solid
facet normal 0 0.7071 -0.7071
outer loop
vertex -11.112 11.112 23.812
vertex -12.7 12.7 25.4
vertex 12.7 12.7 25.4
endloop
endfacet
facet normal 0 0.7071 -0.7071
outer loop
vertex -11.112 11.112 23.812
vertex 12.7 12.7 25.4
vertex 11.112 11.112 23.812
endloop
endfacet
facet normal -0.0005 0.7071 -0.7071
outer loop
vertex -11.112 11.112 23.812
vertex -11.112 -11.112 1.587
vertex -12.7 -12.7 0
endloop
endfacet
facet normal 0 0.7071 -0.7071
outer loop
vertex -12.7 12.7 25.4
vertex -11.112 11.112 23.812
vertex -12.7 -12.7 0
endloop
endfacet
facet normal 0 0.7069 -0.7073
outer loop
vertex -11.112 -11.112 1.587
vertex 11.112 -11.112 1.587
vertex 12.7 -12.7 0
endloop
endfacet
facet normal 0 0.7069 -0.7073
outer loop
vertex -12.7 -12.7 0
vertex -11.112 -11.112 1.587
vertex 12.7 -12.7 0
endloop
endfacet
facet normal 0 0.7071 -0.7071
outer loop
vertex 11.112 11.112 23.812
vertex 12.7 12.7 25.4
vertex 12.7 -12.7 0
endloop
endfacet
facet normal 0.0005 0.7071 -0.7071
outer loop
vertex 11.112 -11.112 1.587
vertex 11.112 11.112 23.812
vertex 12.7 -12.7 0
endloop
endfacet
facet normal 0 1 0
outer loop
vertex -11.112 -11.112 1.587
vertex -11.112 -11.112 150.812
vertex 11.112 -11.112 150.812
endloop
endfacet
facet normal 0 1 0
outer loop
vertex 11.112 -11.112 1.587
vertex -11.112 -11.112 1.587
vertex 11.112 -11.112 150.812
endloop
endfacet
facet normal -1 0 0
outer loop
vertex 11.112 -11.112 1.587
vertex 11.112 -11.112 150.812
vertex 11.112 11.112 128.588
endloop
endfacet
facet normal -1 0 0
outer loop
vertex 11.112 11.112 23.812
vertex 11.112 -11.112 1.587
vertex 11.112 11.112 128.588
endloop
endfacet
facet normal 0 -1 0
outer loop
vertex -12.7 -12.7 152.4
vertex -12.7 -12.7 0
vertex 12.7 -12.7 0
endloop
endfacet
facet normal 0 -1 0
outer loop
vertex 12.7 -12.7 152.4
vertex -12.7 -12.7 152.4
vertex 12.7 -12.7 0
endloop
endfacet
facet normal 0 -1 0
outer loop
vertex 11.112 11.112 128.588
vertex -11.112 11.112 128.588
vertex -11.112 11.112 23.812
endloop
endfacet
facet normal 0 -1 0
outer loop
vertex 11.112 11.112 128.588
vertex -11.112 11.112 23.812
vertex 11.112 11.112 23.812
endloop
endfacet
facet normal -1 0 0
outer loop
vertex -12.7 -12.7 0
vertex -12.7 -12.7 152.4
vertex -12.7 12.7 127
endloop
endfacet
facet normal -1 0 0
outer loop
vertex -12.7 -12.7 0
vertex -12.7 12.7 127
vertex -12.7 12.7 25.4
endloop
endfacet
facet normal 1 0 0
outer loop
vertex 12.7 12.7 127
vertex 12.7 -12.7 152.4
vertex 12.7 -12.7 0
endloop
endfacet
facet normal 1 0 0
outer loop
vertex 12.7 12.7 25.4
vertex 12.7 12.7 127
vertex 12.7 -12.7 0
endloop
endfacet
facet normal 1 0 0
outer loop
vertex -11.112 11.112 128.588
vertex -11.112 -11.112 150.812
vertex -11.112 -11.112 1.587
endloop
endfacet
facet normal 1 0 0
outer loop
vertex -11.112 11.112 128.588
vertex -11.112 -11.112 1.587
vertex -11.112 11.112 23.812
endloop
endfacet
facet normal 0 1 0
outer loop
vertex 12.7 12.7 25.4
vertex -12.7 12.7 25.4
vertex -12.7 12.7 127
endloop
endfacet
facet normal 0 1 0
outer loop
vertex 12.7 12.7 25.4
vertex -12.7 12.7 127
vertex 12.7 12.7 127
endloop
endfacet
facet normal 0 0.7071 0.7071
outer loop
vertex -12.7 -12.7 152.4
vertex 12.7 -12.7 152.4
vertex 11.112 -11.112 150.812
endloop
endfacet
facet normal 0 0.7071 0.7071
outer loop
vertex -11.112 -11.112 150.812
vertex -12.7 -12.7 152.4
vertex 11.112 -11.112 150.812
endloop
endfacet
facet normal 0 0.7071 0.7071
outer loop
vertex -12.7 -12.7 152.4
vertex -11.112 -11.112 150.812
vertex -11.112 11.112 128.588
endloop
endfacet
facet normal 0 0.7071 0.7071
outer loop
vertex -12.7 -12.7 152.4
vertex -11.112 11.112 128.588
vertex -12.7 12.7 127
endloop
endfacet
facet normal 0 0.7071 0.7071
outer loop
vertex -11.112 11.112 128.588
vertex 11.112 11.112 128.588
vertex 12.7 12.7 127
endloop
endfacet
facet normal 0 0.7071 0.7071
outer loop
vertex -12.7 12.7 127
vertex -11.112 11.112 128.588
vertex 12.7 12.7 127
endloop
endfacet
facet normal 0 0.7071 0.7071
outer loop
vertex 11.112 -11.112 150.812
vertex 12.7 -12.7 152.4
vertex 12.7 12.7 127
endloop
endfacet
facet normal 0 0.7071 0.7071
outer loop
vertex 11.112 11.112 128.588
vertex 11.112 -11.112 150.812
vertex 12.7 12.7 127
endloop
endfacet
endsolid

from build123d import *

# Parameters (mm, degrees)
F0_W     = 25.4
F0_H     = 25.4
F0_W_2   = 22.225
F0_H_2   = 22.225
F1_DEPTH = 152.4
F3_DEPTH = 25.4


with BuildPart() as f1:
    # F0 (on Top) → F1 (new body)
    with BuildSketch(Plane.XY):
        Rectangle(F0_W, F0_H)
        Rectangle(F0_W_2, F0_H_2, mode=Mode.SUBTRACT)
    extrude(amount=F1_DEPTH)

    # F2 (on face) → F3 (cut, through all)
    with BuildSketch(Plane.YZ.offset(12.7)):
        Polygon((12.7, 152.4), (-12.7, 152.4), (12.7, 127), align=None)
        Polygon((12.7, 25.4), (-12.7, 0), (12.7, 0), align=None)
    extrude(amount=-F3_DEPTH, mode=Mode.SUBTRACT)


solid = f1.part
